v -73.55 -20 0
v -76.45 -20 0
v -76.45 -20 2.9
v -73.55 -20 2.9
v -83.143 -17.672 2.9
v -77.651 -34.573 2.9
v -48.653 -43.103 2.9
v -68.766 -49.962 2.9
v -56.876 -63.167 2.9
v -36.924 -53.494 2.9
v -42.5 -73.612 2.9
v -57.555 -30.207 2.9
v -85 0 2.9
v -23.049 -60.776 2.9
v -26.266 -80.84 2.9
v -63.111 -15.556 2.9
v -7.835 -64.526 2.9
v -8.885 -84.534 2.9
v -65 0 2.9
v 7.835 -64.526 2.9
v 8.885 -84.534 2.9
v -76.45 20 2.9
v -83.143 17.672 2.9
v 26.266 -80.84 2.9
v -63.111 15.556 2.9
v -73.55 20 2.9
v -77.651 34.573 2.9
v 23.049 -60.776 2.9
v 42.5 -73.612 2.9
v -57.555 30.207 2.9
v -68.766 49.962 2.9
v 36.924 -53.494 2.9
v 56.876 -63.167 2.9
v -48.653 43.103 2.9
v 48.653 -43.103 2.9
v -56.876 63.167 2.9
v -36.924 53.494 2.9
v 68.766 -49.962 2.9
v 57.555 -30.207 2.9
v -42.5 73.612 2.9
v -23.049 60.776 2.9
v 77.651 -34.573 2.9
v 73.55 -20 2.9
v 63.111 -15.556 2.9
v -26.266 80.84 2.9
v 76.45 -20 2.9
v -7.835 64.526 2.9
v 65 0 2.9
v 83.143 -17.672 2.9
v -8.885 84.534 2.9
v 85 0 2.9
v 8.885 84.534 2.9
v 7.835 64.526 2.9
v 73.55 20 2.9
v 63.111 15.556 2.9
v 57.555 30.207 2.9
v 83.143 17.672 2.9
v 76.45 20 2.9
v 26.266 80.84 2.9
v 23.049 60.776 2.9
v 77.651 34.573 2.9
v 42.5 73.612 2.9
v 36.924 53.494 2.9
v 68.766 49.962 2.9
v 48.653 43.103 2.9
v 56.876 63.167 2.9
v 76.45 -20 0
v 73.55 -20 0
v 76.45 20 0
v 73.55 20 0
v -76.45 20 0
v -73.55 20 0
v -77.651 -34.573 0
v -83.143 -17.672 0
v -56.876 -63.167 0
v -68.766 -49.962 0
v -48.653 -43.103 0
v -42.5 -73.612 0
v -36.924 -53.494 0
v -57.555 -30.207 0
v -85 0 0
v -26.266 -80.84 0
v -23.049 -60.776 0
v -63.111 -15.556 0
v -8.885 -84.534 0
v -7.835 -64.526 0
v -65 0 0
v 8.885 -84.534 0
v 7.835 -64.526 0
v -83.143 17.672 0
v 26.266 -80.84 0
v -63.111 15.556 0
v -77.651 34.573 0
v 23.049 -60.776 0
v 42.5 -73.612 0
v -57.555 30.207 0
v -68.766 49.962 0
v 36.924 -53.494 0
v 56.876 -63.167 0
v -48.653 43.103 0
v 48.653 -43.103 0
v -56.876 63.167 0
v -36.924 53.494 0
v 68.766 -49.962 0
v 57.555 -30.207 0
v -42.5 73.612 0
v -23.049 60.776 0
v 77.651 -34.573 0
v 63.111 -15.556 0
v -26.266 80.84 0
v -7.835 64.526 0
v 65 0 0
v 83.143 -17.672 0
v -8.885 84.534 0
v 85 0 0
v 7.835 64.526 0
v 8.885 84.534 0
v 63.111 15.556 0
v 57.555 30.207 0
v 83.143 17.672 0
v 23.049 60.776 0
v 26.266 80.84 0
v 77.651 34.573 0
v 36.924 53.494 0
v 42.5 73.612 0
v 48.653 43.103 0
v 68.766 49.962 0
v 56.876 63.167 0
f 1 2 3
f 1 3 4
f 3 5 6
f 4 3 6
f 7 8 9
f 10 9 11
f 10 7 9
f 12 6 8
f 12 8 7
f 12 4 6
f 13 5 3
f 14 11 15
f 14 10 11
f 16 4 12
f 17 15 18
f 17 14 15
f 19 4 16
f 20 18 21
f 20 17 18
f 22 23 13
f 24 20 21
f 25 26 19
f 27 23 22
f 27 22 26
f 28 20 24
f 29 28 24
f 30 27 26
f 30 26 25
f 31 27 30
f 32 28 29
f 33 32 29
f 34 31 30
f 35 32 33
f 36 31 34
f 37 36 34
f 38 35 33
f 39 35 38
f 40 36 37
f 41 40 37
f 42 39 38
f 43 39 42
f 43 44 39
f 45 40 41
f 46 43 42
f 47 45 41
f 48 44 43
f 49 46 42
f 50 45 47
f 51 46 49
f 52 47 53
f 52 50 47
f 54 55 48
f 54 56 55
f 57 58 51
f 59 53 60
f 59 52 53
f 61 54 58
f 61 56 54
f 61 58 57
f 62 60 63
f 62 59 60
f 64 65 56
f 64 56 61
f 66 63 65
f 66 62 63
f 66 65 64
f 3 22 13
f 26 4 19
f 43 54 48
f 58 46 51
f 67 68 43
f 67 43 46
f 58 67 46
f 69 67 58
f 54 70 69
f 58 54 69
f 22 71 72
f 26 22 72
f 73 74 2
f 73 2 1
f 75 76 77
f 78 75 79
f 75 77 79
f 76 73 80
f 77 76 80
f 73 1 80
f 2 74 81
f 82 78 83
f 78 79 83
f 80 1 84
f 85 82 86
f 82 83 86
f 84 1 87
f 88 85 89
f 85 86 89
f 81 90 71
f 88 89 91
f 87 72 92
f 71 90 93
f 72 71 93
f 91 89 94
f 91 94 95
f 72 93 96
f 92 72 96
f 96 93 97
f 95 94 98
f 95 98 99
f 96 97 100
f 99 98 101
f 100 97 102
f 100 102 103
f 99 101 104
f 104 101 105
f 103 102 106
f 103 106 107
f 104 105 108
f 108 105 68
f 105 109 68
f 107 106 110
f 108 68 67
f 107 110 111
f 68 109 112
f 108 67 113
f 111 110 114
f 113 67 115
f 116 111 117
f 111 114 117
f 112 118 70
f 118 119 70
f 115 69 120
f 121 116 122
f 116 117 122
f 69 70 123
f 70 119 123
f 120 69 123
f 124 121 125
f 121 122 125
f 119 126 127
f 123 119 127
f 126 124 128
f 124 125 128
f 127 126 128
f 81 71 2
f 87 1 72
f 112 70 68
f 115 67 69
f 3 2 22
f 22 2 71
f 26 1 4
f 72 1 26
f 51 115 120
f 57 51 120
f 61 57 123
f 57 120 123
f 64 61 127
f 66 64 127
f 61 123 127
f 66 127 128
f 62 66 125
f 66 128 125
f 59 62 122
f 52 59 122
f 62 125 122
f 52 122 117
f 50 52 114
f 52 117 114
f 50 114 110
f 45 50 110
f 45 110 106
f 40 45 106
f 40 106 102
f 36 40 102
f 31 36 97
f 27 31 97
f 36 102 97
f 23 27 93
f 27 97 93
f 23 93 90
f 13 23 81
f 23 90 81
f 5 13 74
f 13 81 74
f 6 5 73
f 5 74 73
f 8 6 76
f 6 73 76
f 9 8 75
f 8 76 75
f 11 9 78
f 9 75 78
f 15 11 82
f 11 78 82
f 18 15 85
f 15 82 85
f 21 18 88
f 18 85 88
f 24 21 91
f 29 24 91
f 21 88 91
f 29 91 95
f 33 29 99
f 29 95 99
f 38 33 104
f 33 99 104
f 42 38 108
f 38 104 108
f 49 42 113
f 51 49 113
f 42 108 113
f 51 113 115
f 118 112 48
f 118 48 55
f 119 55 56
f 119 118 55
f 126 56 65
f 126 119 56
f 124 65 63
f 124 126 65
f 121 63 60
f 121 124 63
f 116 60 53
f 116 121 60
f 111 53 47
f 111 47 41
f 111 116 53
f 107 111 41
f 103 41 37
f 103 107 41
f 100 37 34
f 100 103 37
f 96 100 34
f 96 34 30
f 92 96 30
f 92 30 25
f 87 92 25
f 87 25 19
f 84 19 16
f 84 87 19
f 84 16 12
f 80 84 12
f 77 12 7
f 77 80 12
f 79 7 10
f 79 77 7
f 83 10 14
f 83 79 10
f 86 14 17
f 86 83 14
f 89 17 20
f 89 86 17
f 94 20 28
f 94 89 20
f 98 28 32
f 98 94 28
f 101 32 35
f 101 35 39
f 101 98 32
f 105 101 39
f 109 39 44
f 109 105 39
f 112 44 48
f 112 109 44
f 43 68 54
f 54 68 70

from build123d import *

# Parameters (mm, degrees)
SKETCH1_R           = 85
SKETCH1_R_2         = 65
SKETCH1_W           = 2.9
SKETCH1_H           = 40
BOSS_EXTRUDE1_DEPTH = 2.9


with BuildPart() as part:
    # Sketch1 → Boss-Extrude1 (new body)
    with BuildSketch(Plane.XY):
        Circle(SKETCH1_R)
        Circle(SKETCH1_R_2, mode=Mode.SUBTRACT)
        with Locations((-75, 0)):
            Rectangle(SKETCH1_W, SKETCH1_H, mode=Mode.SUBTRACT)
        with Locations((75, 0)):
            Rectangle(SKETCH1_W, SKETCH1_H, mode=Mode.SUBTRACT)
    extrude(amount=BOSS_EXTRUDE1_DEPTH)


solid = part.part
